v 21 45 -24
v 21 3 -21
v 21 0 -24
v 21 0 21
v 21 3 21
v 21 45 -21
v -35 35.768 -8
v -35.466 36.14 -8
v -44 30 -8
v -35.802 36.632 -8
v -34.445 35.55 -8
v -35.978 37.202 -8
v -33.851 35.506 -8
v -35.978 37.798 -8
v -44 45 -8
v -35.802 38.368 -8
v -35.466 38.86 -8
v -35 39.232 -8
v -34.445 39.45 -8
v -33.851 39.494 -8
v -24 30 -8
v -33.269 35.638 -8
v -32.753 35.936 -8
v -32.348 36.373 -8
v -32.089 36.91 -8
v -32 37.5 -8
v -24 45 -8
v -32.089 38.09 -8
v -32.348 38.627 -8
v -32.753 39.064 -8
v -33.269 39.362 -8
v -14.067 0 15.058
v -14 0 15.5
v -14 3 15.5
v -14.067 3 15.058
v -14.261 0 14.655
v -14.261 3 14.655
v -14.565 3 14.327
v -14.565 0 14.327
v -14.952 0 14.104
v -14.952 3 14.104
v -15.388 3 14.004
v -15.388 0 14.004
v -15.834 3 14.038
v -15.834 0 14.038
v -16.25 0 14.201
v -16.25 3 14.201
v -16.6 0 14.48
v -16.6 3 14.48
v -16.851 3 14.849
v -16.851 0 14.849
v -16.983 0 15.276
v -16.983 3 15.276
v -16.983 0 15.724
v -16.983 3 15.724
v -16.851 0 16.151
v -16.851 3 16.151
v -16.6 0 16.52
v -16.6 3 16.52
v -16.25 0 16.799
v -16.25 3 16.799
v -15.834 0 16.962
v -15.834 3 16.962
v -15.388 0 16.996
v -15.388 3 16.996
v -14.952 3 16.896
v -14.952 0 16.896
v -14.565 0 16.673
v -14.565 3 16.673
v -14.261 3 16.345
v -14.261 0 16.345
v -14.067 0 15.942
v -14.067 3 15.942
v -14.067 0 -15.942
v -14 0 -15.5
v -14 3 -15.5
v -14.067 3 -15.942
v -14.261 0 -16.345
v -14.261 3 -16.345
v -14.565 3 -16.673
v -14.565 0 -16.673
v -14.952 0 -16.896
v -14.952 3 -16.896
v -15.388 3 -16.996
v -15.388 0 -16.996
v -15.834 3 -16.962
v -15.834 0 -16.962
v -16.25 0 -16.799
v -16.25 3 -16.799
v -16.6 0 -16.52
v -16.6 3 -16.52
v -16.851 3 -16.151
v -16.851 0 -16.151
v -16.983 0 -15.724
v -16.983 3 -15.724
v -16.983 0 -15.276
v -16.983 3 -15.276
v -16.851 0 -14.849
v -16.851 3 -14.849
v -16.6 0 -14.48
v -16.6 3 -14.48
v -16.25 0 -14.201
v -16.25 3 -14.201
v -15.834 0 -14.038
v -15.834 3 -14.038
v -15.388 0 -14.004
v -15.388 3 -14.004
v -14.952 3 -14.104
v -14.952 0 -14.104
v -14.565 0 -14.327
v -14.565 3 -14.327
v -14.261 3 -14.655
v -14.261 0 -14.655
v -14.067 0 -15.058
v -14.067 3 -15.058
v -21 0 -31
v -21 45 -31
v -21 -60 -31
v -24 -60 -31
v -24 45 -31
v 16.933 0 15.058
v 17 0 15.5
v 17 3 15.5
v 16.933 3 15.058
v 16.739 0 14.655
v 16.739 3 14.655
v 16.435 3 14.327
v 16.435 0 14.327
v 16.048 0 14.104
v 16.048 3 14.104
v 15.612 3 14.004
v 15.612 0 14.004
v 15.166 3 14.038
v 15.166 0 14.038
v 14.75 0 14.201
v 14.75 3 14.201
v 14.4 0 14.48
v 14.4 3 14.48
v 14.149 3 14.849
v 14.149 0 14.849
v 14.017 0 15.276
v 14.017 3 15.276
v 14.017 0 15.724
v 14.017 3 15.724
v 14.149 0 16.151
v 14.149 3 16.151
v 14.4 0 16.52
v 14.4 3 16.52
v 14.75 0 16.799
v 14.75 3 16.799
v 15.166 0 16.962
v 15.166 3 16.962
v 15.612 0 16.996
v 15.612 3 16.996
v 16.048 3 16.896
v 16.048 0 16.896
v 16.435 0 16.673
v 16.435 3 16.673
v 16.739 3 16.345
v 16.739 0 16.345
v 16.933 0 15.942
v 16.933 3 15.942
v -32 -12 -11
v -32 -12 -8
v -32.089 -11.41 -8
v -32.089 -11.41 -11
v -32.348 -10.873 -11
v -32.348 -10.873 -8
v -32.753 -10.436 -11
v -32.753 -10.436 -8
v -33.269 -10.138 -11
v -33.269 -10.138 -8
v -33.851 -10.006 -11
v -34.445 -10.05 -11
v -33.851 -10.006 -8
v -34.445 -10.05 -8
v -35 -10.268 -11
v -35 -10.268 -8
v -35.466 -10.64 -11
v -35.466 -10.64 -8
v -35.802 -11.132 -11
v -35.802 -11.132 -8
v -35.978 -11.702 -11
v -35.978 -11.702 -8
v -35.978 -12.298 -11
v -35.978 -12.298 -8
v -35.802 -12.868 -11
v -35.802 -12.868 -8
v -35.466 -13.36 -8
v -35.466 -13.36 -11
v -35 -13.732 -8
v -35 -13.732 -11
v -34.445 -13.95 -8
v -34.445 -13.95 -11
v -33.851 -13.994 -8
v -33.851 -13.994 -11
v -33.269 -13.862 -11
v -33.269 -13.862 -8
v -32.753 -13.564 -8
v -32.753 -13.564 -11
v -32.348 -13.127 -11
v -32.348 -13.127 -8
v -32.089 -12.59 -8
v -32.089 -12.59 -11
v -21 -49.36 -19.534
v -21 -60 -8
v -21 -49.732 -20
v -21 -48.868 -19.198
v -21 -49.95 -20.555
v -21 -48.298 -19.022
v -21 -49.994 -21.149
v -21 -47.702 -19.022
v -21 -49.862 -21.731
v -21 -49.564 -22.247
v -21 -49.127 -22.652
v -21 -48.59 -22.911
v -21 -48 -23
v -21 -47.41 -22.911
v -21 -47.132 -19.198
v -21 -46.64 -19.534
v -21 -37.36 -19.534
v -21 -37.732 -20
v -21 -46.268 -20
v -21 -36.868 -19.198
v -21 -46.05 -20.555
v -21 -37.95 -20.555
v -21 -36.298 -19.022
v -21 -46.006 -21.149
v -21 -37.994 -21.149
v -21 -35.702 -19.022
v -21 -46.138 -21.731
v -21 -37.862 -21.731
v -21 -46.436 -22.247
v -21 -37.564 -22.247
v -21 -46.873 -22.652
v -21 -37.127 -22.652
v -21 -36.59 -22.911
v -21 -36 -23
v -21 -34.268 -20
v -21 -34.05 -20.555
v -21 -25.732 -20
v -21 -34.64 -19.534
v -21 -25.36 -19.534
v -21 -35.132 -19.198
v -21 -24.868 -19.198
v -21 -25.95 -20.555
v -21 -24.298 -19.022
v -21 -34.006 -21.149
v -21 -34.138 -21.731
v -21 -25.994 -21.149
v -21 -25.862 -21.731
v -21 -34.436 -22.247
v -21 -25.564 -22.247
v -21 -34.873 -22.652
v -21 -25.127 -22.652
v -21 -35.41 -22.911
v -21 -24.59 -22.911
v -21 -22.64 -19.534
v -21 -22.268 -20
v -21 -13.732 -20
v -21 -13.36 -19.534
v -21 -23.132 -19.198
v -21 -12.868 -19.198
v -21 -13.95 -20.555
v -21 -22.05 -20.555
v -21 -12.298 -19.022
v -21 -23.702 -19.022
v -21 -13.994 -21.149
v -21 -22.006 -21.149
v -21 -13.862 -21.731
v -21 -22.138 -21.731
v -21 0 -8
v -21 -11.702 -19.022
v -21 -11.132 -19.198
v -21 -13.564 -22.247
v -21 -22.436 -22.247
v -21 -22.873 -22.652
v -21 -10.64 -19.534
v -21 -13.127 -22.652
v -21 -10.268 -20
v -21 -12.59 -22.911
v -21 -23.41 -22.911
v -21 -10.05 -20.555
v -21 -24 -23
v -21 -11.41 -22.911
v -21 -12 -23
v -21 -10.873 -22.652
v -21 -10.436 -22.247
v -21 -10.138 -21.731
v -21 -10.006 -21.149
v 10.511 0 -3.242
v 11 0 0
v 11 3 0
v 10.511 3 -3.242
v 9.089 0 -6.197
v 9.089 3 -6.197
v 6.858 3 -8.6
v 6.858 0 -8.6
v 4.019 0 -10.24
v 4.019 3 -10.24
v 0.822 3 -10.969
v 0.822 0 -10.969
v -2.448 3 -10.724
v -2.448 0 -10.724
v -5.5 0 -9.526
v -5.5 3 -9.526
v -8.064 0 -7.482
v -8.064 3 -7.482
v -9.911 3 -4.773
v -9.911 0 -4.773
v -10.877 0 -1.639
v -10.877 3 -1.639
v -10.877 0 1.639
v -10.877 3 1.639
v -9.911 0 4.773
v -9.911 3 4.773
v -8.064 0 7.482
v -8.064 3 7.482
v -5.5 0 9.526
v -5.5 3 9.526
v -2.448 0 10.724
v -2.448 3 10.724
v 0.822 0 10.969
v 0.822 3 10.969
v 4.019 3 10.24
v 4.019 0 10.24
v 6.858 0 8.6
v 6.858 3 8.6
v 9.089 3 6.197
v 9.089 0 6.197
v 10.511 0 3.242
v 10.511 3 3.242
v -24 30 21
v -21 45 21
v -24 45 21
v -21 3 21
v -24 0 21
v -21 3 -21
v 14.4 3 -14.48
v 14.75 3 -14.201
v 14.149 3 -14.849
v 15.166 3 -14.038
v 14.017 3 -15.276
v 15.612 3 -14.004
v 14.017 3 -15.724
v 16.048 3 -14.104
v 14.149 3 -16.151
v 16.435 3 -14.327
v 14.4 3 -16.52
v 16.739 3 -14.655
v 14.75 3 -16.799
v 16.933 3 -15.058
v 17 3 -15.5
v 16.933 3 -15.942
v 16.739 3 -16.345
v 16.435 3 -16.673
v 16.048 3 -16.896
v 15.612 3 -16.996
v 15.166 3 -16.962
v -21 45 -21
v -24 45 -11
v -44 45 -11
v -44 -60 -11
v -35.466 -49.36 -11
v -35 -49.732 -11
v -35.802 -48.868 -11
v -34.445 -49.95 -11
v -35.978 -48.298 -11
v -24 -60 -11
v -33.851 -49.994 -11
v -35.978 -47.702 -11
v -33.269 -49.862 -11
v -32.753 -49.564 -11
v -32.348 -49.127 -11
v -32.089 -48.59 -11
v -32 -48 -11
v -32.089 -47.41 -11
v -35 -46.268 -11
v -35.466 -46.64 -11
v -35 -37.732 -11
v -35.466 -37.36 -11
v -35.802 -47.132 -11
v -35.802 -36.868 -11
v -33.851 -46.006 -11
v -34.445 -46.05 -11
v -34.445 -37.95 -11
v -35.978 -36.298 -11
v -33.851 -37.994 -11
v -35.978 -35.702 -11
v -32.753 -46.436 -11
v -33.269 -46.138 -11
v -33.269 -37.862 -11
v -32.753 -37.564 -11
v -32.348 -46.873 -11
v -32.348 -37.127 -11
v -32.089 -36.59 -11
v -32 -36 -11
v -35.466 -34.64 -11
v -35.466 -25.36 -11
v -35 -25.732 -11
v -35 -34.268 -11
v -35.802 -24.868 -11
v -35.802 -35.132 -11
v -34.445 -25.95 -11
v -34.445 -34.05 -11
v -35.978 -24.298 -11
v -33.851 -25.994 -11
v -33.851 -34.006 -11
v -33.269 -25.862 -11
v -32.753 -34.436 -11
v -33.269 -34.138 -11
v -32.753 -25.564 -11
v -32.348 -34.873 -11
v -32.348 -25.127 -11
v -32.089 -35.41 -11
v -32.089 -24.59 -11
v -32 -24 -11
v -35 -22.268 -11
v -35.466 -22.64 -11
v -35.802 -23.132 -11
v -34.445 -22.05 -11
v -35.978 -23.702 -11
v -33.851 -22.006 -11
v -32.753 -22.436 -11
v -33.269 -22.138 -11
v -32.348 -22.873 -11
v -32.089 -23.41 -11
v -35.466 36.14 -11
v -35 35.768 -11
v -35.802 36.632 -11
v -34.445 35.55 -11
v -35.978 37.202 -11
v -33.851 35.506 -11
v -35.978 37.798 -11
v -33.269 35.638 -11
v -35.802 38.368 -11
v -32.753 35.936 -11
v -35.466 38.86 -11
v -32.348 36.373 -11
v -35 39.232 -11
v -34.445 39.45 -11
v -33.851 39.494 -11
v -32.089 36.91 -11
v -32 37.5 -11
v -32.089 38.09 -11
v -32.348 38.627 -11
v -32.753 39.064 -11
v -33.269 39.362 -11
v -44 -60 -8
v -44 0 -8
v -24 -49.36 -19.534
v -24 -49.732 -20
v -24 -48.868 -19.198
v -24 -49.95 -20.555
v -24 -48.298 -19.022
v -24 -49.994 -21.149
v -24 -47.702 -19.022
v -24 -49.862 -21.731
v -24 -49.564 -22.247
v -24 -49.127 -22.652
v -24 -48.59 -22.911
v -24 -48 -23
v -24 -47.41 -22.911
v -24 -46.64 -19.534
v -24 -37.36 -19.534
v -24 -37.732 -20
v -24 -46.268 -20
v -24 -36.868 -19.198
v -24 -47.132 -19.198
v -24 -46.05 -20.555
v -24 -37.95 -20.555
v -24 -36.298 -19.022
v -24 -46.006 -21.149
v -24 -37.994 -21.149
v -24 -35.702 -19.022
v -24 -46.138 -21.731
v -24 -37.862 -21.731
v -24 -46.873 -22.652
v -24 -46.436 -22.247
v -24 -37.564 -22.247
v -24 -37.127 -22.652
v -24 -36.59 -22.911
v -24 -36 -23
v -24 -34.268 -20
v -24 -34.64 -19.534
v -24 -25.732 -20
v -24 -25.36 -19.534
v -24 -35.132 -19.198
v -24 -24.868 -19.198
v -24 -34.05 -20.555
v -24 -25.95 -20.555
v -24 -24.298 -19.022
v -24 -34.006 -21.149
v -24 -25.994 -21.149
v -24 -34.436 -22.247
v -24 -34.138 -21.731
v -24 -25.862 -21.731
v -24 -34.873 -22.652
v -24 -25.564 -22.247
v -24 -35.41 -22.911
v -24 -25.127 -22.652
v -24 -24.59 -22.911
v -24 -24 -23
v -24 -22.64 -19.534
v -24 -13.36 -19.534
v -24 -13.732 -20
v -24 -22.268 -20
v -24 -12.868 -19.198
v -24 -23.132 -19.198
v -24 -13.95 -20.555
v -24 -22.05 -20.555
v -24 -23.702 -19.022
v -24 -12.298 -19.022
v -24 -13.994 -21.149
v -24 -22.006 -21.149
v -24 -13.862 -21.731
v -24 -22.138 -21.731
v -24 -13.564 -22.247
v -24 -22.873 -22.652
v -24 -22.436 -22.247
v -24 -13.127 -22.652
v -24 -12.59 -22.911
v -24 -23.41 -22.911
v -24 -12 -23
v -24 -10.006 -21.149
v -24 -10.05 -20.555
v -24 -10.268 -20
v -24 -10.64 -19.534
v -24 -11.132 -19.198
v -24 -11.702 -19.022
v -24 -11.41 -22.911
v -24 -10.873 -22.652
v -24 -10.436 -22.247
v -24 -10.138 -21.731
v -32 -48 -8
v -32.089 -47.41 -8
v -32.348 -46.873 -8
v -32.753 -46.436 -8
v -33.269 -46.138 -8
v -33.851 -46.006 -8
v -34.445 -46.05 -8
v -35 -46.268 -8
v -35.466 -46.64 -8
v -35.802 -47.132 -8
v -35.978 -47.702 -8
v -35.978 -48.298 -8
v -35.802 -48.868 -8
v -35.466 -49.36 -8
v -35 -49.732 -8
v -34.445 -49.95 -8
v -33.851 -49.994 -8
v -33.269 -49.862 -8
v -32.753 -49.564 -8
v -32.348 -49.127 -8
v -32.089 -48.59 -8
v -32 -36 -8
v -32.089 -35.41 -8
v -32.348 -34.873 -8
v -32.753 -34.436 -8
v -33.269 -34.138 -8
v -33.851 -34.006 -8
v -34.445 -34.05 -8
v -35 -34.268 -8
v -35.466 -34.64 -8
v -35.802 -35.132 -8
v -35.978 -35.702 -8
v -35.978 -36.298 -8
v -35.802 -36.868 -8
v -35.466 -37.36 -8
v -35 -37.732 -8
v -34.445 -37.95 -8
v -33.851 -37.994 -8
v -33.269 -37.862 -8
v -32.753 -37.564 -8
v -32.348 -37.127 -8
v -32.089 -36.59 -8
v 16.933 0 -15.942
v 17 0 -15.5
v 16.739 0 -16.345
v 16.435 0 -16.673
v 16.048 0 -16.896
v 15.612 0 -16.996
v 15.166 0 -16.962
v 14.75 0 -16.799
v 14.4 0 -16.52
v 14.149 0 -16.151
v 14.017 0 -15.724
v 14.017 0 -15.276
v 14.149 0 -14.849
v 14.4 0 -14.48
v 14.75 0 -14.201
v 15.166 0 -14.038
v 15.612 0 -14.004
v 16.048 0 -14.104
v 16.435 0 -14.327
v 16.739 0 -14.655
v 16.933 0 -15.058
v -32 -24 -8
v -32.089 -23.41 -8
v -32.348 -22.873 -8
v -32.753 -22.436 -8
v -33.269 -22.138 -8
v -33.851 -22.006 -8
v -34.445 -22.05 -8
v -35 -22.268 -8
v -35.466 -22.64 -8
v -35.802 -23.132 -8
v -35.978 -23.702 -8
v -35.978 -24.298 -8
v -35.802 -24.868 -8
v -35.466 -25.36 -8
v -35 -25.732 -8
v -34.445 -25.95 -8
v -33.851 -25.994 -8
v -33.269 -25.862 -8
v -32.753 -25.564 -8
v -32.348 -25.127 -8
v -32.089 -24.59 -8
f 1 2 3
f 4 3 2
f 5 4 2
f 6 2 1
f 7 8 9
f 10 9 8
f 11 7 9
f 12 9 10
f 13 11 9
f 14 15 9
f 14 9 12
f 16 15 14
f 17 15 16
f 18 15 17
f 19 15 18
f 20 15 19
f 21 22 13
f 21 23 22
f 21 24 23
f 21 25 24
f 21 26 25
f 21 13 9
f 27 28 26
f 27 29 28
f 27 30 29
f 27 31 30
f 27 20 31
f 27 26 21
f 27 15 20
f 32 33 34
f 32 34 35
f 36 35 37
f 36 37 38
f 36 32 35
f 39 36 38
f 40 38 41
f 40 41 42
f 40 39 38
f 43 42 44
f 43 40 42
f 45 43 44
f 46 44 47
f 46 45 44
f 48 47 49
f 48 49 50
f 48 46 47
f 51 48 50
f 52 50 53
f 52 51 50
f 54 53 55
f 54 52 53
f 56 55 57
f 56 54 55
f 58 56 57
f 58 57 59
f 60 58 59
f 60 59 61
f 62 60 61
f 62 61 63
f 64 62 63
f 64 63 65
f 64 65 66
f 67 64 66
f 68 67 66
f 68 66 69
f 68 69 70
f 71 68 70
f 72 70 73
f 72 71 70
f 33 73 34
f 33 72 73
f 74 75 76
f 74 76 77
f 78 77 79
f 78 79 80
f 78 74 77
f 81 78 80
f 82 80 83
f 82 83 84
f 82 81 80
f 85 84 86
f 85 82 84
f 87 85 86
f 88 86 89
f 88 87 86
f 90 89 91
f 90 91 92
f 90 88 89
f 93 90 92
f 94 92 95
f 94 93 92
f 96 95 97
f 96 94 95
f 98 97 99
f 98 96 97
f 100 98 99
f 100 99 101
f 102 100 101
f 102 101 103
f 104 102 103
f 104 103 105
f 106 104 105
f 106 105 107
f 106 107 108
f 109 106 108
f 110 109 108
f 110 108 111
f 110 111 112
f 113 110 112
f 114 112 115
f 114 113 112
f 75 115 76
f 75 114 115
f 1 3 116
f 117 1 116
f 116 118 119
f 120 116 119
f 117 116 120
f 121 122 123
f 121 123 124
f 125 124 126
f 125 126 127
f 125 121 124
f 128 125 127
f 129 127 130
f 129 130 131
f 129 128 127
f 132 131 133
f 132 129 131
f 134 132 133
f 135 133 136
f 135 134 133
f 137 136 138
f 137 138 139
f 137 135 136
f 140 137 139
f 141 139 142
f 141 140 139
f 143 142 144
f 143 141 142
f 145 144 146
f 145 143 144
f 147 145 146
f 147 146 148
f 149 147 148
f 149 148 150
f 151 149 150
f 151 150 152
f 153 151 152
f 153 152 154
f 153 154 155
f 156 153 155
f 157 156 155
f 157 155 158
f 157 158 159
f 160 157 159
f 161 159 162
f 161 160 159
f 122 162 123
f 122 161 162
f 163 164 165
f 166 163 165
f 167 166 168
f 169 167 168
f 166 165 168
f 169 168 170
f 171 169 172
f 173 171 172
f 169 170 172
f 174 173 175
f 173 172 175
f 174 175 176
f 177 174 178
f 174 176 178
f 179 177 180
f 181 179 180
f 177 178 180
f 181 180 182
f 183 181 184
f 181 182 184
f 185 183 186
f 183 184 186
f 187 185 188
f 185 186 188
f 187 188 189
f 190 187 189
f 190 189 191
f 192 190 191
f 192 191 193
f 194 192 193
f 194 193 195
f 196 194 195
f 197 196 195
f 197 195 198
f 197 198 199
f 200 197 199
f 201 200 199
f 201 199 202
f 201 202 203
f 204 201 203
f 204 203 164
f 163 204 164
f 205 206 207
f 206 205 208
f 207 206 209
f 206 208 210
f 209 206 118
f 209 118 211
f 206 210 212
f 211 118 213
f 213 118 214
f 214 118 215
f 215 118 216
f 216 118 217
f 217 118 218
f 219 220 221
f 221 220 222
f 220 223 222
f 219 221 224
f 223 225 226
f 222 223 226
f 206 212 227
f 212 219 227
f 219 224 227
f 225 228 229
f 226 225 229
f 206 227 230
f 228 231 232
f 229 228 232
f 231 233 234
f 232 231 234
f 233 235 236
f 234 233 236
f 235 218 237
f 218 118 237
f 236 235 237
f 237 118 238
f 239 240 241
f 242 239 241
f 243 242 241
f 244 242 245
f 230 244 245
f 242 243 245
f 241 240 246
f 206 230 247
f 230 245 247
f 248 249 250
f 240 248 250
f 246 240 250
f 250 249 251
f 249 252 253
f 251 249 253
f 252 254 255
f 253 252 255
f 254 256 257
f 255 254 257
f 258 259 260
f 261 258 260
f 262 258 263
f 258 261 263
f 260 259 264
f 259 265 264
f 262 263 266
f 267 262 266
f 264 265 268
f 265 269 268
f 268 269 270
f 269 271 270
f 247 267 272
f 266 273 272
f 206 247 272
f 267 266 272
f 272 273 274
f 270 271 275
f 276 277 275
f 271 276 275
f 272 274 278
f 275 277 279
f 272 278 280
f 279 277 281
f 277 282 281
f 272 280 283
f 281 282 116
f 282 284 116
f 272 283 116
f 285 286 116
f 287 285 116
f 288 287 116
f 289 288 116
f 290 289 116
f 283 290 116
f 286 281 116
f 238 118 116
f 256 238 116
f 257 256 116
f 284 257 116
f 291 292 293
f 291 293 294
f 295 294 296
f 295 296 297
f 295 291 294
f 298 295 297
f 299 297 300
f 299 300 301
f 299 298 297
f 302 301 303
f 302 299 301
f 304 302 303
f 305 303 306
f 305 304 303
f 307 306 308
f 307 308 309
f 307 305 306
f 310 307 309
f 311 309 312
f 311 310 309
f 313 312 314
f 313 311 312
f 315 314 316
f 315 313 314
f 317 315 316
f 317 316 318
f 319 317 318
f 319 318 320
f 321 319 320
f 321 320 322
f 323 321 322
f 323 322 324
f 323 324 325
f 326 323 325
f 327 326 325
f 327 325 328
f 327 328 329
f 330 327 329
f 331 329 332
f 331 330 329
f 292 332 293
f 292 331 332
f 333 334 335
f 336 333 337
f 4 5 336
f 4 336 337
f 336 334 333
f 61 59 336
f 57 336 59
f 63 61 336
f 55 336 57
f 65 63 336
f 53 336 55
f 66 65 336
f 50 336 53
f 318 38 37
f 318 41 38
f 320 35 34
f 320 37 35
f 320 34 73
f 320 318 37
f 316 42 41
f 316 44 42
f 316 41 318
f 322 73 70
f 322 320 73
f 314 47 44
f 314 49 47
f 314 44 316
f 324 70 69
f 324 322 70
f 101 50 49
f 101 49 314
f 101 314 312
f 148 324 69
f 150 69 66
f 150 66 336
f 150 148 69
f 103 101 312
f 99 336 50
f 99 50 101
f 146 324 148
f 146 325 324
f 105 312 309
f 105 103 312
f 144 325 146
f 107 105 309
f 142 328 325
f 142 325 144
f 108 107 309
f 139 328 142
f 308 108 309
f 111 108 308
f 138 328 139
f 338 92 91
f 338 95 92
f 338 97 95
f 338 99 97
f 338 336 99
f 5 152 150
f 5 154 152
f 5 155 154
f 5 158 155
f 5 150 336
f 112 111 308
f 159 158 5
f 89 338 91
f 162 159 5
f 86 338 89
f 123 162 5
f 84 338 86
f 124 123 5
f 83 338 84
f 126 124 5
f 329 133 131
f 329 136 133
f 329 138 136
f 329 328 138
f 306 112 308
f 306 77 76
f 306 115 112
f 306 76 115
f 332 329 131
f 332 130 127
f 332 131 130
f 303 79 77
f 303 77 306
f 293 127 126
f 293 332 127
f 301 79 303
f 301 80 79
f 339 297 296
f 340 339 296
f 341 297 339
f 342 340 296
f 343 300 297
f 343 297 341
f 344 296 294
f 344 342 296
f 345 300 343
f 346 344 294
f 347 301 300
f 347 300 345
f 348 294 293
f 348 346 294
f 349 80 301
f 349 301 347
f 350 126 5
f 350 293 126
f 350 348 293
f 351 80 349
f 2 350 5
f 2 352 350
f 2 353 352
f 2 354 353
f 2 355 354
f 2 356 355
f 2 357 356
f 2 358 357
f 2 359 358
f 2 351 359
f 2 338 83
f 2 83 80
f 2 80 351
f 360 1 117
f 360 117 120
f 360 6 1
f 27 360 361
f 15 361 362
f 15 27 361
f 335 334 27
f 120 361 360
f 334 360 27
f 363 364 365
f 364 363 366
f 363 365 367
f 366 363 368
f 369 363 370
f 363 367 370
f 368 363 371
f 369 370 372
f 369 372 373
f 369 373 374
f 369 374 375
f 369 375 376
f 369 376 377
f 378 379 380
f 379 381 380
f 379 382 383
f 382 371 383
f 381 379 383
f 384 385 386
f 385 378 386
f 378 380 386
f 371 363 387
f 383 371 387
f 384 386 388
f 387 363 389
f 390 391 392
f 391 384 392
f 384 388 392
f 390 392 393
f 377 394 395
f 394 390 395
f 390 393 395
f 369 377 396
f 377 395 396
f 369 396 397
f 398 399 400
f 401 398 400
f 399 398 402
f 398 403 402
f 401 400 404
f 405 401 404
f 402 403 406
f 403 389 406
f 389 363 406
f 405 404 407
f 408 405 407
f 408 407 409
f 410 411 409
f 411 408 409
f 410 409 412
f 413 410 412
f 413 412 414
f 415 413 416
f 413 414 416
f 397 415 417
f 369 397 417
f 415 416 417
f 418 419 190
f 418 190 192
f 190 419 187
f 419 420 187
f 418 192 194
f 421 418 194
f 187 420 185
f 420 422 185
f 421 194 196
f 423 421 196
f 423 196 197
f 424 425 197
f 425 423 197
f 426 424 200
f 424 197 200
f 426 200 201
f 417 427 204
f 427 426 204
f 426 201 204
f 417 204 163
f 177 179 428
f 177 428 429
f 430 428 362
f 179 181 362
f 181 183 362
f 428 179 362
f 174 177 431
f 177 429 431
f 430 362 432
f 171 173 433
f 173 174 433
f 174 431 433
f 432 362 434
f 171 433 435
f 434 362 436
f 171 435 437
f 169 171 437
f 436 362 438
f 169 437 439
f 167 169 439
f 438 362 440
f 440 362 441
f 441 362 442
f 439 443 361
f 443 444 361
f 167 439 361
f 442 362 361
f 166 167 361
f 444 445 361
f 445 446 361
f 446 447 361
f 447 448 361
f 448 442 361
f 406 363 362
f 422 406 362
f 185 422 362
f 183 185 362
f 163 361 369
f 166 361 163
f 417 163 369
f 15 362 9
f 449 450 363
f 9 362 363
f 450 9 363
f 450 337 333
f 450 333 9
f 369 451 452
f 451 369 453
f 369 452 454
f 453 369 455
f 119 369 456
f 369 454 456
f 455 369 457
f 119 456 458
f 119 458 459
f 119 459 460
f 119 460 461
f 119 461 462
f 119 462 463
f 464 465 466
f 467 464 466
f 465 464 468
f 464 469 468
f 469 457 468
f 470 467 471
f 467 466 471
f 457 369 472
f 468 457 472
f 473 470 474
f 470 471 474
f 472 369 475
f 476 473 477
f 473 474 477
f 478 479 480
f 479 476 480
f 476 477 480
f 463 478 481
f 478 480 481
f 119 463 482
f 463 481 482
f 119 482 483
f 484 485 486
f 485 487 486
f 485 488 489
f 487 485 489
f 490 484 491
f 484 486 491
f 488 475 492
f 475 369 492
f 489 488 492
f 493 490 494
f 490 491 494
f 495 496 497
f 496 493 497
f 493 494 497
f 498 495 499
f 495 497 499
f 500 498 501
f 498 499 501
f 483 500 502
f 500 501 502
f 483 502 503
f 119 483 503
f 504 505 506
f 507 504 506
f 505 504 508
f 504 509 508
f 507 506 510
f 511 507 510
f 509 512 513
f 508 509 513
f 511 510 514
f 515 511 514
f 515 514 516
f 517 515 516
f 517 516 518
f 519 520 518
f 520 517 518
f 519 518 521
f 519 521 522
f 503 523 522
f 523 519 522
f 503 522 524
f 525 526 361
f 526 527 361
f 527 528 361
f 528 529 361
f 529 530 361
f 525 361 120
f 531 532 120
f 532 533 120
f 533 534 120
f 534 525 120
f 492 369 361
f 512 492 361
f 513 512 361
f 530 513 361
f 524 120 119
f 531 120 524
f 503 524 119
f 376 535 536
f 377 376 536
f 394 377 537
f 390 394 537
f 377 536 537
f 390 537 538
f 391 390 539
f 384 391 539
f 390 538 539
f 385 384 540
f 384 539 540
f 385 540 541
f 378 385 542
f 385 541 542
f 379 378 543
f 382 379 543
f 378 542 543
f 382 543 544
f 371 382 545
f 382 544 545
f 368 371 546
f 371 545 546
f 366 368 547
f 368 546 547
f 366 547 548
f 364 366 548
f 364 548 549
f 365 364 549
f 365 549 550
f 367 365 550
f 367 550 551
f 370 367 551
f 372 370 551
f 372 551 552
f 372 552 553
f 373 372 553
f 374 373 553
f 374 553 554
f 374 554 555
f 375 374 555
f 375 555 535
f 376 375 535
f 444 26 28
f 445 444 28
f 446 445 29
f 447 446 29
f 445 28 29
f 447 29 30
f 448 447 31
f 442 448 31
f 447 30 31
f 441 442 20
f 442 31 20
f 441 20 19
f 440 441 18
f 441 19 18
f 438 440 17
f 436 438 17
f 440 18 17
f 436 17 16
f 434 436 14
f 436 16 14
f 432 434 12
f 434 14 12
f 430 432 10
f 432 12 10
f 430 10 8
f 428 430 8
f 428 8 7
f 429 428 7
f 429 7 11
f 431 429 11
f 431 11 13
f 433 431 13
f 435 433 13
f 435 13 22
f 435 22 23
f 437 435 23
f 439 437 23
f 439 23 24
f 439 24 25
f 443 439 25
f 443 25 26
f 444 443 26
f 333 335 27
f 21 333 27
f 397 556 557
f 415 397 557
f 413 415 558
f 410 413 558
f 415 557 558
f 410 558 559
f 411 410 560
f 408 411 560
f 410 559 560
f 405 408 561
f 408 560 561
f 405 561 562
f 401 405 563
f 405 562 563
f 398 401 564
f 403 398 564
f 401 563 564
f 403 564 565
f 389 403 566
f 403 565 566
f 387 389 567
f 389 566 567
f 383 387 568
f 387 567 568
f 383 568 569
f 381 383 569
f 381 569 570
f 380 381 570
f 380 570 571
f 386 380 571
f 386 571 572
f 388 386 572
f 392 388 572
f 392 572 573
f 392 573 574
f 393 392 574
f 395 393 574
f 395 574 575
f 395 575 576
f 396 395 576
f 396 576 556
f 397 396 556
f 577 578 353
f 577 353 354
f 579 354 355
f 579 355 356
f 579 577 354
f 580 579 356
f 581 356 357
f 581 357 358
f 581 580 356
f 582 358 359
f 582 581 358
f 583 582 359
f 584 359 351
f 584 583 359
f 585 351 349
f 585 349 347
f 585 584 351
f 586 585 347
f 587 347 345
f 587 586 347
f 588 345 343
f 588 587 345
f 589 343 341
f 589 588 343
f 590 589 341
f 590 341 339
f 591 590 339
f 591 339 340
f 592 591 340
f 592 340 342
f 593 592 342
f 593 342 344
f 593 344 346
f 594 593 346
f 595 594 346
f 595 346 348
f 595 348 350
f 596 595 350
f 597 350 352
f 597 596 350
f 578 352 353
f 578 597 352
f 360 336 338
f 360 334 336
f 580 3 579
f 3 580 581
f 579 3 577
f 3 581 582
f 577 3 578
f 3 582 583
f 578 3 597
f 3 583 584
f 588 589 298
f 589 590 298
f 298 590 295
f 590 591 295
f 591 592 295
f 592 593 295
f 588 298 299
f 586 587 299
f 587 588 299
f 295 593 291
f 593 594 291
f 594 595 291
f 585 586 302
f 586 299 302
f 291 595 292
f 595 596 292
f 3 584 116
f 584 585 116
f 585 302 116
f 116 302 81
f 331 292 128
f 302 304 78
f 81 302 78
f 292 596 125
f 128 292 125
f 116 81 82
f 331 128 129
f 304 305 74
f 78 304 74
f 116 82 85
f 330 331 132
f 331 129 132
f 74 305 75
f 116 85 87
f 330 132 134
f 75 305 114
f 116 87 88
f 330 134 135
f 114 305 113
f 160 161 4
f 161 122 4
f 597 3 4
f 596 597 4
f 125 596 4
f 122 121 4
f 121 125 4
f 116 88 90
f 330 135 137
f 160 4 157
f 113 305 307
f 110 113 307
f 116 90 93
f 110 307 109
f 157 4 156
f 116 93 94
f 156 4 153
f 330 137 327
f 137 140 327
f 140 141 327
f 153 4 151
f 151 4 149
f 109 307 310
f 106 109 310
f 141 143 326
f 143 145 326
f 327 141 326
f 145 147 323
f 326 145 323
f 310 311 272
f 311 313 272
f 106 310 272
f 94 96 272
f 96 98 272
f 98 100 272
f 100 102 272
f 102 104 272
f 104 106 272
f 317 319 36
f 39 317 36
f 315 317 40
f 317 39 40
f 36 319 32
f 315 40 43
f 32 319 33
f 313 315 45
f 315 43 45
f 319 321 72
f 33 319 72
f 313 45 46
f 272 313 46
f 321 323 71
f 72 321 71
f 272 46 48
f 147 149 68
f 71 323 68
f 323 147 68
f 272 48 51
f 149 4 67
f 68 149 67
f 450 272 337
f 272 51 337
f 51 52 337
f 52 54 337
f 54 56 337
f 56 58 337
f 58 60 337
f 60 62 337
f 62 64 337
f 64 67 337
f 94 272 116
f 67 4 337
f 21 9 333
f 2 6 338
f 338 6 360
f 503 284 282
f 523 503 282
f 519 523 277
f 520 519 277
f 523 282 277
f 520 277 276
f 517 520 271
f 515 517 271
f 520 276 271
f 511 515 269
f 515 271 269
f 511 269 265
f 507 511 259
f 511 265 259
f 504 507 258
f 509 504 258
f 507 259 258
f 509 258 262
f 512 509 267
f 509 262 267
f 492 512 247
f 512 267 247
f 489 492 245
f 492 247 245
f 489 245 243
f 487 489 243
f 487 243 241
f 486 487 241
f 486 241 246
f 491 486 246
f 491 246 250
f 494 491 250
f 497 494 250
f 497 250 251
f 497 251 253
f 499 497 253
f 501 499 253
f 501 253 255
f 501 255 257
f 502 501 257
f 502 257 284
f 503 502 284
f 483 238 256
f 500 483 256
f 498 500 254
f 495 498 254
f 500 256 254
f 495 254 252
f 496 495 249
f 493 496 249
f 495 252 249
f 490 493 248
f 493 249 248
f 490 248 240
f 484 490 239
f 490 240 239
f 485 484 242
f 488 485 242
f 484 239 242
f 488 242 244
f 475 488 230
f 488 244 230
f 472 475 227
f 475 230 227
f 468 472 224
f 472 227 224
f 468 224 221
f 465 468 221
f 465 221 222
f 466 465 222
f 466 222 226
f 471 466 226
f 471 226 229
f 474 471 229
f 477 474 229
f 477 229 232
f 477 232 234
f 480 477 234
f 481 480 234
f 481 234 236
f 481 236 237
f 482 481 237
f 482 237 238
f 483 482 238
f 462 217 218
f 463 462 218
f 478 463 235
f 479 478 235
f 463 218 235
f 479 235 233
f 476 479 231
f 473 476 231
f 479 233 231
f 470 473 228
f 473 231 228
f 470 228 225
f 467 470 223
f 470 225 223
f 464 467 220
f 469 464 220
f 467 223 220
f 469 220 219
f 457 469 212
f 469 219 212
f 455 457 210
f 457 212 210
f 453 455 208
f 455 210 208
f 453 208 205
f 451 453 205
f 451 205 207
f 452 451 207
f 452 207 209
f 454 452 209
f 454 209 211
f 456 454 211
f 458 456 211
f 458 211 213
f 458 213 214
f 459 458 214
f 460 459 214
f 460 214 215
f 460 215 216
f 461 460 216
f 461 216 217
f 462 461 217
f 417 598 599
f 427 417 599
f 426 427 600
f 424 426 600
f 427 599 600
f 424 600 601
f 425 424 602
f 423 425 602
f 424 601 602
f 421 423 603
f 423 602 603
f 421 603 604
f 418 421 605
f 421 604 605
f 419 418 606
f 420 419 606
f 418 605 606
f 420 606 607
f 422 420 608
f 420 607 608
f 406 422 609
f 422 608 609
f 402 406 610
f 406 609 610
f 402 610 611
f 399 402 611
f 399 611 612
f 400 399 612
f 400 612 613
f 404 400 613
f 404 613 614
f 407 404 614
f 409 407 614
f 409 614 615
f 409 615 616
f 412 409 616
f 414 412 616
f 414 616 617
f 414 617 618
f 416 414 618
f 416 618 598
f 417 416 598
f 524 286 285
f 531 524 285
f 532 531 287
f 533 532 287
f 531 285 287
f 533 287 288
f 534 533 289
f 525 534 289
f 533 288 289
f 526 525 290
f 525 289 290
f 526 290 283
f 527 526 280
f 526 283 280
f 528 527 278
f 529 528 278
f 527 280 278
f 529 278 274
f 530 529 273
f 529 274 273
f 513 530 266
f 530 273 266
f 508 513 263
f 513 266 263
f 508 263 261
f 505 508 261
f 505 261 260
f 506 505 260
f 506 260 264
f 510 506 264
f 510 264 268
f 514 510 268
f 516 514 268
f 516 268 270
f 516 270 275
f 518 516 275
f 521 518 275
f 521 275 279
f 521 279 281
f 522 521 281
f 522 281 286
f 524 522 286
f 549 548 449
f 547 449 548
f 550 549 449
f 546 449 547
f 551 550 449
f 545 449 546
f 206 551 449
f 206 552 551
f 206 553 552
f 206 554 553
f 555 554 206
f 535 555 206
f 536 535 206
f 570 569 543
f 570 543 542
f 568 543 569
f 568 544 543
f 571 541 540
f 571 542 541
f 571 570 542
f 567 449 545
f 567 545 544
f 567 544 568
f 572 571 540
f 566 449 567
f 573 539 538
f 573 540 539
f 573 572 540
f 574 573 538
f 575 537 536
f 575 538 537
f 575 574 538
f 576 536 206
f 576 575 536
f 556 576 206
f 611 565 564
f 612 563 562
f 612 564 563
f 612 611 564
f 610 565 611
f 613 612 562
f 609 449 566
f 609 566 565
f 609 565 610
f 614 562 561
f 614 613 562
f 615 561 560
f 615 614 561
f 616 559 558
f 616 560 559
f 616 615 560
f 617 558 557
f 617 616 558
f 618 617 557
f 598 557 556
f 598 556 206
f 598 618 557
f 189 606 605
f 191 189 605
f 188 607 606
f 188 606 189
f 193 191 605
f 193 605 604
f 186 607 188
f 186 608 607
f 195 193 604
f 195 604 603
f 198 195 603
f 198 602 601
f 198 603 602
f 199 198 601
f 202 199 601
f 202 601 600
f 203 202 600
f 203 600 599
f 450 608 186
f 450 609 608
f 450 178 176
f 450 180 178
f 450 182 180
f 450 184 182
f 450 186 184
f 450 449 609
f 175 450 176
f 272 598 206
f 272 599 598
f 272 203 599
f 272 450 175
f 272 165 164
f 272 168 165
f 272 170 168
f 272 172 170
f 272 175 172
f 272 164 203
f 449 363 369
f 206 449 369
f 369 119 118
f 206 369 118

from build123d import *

# Parameters (mm, degrees)
SKETCH1_W           = 42
SKETCH1_H           = 42
SKETCH1_R           = 11
SKETCH1_R_2         = 1.5
BOSS_EXTRUDE1_DEPTH = 3
BOSS_EXTRUDE2_DEPTH = 3
SKETCH4_W           = 42
SKETCH4_H           = 45
BOSS_EXTRUDE3_DEPTH = 3
BOSS_EXTRUDE4_DEPTH = 3
BOSS_EXTRUDE5_DEPTH = 30
SKETCH7_R           = 2
CUT_EXTRUDE1_DEPTH  = 24
BOSS_EXTRUDE6_DEPTH = 45
SKETCH9_R           = 2
CUT_EXTRUDE2_DEPTH  = 24


with BuildPart() as part:
    # Sketch1 → Boss-Extrude1 (new body)
    with BuildSketch(Plane(origin=(0, 0, 0), x_dir=(1, 0, 0), z_dir=(0, 1, 0))):
        Rectangle(SKETCH1_W, SKETCH1_H)
        Circle(SKETCH1_R, mode=Mode.SUBTRACT)
        with Locations((-15.5, -15.5)):
            Circle(SKETCH1_R_2, mode=Mode.SUBTRACT)
        with Locations((15.5, -15.5)):
            Circle(SKETCH1_R_2, mode=Mode.SUBTRACT)
        with Locations((-15.5, 15.5)):
            Circle(SKETCH1_R_2, mode=Mode.SUBTRACT)
        with Locations((15.5, 15.5)):
            Circle(SKETCH1_R_2, mode=Mode.SUBTRACT)
    extrude(amount=BOSS_EXTRUDE1_DEPTH)

    # Sketch2 → Boss-Extrude2 (add)
    with BuildSketch(Plane.ZY.offset(21)):
        Polygon((-11, 0), (-11, -60), (-31, -60), (-31, 45), (21, 45), (21, 0), align=None)
    extrude(amount=BOSS_EXTRUDE2_DEPTH)

    # Sketch4 → Boss-Extrude3 (add)
    with BuildSketch(Plane(origin=(0, 0, -21), x_dir=(-1, 0, 0), z_dir=(0, 0, -1))):
        with Locations((0, 22.5)):
            Rectangle(SKETCH4_W, SKETCH4_H)
    extrude(amount=BOSS_EXTRUDE3_DEPTH)

    # Sketch5 → Boss-Extrude4 (add)
    with BuildSketch(Plane.XY.offset(-11)):
        Polygon((-44, -60), (-21, -60), (-21, 0), (-24, 0), (-24, 45), (-44, 45), align=None)
    extrude(amount=BOSS_EXTRUDE4_DEPTH)

    # Sketch6 → Boss-Extrude5 (add)
    with BuildSketch(Plane.XZ):
        Polygon((-24, 21), (-44, -8), (-24, -8), align=None)
    extrude(amount=-BOSS_EXTRUDE5_DEPTH)

    # Sketch7 → Cut-Extrude1 (cut, through all)
    with BuildSketch(Plane.XY.offset(-8)):
        with Locations((-34, 37.5)):
            Circle(SKETCH7_R)
        with Locations((-34, -12)):
            Circle(SKETCH7_R)
        with Locations((-34, -24)):
            Circle(SKETCH7_R)
        with Locations((-34, -36)):
            Circle(SKETCH7_R)
        with Locations((-34, -48)):
            Circle(SKETCH7_R)
    extrude(amount=-CUT_EXTRUDE1_DEPTH, mode=Mode.SUBTRACT)

    # Sketch8 → Boss-Extrude6 (add)
    with BuildSketch(Plane.XZ):
        Polygon((21, -24), (-21, -31), (-21, -24), align=None)
    extrude(amount=-BOSS_EXTRUDE6_DEPTH)

    # Sketch9 → Cut-Extrude2 (cut, through all)
    with BuildSketch(Plane(origin=(-21, 0, 0), x_dir=(0, 0, -1), z_dir=(1, 0, 0))):
        with Locations((21, -12)):
            Circle(SKETCH9_R)
        with Locations((21, -24)):
            Circle(SKETCH9_R)
        with Locations((21, -36)):
            Circle(SKETCH9_R)
        with Locations((21, -48)):
            Circle(SKETCH9_R)
    extrude(amount=-CUT_EXTRUDE2_DEPTH, mode=Mode.SUBTRACT)


solid = part.part
